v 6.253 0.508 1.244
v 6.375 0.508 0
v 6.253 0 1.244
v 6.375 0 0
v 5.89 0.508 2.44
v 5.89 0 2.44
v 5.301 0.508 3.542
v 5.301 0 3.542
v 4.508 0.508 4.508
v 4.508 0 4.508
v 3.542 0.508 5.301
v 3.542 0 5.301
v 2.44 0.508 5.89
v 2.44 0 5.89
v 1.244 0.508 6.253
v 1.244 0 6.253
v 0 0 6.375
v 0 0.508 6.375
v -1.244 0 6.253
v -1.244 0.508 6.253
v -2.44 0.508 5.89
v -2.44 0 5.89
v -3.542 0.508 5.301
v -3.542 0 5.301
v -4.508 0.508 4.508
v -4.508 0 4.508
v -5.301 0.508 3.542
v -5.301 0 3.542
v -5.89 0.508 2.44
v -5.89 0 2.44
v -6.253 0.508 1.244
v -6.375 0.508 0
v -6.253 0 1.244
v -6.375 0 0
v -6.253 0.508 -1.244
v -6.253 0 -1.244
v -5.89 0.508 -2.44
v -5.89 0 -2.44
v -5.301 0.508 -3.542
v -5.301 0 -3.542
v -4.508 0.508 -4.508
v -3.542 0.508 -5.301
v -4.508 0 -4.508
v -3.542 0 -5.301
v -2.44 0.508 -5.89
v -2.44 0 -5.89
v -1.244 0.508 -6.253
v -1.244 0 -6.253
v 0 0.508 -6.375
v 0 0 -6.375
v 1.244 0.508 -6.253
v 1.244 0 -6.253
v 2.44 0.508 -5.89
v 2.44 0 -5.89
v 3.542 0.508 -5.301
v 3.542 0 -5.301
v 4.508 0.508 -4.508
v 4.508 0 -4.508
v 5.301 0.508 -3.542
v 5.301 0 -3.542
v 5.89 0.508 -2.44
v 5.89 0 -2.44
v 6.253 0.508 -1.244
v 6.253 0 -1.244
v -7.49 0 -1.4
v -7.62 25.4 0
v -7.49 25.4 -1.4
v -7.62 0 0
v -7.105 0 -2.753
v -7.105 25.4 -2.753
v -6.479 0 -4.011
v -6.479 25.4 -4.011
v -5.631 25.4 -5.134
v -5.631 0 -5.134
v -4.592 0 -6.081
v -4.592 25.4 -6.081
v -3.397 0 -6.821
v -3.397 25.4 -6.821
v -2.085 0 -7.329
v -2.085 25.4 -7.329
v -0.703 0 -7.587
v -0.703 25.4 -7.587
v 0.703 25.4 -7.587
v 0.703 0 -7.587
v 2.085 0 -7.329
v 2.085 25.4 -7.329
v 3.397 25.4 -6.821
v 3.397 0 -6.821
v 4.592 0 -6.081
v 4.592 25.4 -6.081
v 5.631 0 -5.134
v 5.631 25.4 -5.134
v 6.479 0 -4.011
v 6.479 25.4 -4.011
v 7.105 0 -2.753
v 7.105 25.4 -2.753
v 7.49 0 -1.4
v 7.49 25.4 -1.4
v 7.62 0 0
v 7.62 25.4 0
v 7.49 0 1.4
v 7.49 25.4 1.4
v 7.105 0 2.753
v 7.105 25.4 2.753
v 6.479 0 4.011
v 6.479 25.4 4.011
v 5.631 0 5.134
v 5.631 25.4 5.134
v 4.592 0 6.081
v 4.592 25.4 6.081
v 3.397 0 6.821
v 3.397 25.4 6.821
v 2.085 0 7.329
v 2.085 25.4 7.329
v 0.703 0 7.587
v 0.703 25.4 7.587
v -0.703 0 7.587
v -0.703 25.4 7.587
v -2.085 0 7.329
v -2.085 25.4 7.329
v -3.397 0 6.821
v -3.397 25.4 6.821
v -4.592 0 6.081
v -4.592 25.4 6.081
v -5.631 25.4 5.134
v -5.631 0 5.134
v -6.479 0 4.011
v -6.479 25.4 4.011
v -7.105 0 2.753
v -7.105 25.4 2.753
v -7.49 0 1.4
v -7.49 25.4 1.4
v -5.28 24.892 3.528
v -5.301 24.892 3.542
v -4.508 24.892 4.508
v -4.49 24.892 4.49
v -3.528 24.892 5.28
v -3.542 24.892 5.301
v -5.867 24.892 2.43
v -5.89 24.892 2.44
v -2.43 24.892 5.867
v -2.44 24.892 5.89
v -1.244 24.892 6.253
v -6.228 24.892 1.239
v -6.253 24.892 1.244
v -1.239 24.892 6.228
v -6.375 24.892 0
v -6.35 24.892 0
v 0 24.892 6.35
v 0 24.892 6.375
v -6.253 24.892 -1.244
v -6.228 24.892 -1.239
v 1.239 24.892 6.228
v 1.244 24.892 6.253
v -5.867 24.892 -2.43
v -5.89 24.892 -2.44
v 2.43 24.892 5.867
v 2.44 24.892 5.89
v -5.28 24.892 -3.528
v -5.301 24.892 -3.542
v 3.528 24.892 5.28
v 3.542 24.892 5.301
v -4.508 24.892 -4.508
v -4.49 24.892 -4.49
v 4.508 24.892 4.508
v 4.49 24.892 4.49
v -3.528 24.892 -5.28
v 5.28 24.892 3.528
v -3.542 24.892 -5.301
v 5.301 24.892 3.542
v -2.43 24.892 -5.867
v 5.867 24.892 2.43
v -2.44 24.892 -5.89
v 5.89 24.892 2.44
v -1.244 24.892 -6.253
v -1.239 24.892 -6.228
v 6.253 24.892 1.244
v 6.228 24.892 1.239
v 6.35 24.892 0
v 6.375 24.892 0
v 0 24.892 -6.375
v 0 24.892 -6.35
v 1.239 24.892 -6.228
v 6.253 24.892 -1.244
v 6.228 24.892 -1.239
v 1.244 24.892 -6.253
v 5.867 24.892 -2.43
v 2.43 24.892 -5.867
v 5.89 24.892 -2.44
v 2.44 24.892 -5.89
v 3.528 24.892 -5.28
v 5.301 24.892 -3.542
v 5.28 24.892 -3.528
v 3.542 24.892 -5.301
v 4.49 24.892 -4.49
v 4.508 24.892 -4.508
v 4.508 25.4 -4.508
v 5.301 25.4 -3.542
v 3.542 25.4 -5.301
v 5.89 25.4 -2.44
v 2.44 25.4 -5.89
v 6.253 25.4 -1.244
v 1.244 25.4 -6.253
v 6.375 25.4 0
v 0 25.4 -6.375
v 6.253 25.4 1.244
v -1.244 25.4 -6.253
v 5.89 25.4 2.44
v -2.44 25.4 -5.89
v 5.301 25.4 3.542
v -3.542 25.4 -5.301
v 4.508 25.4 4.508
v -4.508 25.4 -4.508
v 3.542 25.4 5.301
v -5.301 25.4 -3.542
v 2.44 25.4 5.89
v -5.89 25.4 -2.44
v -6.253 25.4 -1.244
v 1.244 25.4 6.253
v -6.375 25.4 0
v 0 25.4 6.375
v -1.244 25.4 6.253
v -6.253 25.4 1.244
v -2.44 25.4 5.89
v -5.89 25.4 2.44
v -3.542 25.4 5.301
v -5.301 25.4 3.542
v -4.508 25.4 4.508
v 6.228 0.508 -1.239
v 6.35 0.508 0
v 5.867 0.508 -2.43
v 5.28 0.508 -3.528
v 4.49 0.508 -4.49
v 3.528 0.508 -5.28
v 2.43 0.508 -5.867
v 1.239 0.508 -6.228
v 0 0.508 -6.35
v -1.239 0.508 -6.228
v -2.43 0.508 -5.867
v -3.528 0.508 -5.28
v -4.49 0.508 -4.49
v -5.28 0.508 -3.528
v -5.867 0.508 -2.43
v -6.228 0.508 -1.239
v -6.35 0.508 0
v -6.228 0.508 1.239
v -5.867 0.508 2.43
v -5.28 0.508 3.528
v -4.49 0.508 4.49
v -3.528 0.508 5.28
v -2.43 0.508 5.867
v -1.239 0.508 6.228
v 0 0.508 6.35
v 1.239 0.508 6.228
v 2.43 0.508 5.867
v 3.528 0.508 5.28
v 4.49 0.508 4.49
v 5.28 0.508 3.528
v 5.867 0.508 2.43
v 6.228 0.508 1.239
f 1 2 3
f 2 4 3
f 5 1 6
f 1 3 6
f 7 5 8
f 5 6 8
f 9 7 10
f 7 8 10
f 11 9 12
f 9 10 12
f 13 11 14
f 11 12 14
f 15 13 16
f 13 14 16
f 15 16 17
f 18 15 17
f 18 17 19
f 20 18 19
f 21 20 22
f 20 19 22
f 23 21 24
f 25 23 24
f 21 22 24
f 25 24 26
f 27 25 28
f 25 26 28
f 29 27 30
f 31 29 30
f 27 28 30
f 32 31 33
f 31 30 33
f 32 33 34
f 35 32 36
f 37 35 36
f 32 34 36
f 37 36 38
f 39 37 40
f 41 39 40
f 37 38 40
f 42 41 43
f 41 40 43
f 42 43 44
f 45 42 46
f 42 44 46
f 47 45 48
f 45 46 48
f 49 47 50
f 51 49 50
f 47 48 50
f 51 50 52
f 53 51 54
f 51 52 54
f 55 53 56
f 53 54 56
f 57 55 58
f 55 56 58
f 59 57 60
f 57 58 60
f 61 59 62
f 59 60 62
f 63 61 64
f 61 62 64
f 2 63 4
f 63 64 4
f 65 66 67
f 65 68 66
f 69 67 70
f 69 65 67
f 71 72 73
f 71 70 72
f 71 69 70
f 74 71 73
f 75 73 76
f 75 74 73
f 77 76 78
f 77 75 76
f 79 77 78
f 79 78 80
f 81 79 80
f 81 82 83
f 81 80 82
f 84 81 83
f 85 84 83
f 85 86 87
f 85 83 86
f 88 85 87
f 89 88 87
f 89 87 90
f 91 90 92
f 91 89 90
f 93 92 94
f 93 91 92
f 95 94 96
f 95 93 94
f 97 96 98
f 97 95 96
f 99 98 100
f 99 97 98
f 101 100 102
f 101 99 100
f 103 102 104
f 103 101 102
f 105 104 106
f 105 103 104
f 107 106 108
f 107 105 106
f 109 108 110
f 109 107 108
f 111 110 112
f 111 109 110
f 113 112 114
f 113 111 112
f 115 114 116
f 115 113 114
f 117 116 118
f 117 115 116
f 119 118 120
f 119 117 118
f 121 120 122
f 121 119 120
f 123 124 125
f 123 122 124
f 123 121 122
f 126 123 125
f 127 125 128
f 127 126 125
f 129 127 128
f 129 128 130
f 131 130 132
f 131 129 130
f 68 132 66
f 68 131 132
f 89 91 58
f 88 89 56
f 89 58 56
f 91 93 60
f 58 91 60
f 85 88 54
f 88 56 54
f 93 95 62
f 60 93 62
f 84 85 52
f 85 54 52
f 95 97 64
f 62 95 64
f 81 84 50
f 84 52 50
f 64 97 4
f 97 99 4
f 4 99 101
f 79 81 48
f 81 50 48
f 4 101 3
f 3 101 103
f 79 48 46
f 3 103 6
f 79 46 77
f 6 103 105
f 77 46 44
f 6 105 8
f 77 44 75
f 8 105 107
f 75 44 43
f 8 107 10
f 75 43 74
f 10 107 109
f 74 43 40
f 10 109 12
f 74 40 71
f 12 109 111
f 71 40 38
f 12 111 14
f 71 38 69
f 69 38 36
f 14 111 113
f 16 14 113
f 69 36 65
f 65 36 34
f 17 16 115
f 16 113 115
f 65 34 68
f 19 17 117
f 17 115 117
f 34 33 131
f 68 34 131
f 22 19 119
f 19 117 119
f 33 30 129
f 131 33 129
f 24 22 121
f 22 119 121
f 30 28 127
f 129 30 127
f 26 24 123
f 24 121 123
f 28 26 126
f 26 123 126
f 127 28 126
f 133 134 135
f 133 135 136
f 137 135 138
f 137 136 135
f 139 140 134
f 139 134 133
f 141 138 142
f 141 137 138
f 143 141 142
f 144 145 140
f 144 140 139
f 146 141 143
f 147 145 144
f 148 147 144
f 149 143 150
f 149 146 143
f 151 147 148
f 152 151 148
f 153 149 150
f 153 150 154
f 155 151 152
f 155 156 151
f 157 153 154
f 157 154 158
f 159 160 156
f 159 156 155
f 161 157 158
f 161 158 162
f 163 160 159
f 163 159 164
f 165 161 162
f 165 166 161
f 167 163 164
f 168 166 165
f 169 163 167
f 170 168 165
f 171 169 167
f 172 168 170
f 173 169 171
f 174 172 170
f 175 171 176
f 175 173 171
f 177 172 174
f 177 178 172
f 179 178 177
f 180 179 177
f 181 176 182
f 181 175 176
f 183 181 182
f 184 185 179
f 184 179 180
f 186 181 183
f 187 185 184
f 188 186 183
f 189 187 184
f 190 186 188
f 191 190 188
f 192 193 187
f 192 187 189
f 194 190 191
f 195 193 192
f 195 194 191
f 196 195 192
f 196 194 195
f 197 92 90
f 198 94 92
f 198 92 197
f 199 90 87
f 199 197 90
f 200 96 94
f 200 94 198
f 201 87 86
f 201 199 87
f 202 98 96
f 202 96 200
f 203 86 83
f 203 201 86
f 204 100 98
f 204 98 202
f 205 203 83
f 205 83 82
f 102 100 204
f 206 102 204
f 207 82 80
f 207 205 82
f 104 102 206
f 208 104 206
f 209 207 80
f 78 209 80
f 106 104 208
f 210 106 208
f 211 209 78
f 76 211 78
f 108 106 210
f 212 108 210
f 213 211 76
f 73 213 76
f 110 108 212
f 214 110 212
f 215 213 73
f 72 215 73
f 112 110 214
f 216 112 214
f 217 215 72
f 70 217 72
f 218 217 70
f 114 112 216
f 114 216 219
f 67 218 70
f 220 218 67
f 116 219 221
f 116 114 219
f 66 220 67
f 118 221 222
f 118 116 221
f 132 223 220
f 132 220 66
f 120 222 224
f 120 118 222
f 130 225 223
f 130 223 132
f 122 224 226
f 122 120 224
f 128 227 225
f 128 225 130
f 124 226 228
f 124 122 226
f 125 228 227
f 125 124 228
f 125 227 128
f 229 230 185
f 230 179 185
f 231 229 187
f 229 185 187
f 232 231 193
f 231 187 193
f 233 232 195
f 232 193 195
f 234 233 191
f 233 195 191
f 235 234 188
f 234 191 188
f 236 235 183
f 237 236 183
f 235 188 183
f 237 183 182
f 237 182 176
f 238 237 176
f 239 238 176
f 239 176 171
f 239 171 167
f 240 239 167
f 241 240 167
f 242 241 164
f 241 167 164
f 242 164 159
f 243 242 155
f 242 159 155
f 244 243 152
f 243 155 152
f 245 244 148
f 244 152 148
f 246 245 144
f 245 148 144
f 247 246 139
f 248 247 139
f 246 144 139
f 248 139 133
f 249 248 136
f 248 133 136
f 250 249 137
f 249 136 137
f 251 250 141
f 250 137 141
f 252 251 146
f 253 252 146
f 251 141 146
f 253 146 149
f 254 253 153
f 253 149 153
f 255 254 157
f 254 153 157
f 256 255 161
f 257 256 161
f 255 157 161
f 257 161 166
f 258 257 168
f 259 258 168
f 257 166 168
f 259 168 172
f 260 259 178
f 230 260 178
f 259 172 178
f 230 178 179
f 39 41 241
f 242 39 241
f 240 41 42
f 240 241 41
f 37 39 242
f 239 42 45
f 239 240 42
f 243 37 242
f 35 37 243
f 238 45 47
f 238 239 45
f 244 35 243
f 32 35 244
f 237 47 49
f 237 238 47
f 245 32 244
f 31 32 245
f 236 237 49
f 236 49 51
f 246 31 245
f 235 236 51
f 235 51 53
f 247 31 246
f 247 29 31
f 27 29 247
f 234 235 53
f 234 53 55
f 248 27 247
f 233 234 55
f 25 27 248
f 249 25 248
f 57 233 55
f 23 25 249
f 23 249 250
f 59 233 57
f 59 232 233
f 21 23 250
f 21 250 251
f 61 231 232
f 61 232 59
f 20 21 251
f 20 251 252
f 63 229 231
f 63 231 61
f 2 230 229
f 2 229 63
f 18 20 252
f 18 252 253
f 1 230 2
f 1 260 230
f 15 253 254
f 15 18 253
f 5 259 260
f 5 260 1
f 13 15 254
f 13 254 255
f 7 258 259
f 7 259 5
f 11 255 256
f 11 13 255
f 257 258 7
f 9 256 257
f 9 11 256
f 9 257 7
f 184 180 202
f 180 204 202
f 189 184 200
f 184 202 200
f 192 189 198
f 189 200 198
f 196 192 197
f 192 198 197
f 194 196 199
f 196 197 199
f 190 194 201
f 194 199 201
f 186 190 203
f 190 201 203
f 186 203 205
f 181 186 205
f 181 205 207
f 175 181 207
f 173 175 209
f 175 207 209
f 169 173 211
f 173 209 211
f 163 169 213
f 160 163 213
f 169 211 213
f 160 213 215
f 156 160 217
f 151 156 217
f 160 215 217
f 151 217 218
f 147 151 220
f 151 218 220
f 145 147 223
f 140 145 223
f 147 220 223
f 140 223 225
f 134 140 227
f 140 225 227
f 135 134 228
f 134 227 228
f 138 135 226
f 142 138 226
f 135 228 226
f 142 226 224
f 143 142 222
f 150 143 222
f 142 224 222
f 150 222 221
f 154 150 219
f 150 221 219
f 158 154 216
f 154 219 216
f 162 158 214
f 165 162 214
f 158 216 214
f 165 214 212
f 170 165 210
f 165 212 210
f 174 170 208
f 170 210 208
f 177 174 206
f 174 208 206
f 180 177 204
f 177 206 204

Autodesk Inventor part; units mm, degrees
ref_plane "YZ Plane" through (0, 0, 0) normal (1, 0, 0) x (0, 1, 0)
ref_plane "XZ Plane" through (0, 0, 0) normal (0, 1, 0) x (-1, 0, 0)
ref_plane "XY Plane" through (0, 0, 0) normal (0, 0, 1) x (1, 0, 0)
sketch "Sketch1" plane through (0, 0, 0) normal (0, 1, 0) x (-1, 0, 0)
  circle A0 centre (0, 0) radius 7.62
  dimension "d0" = 15.24
extrude "Extrusion1" add sketch "Sketch1" along normal blind 25.4
sketch "Sketch2" plane through (0, 25.4, 0) normal (0, 1, 0) x (1, 0, 0)
  circle A0 centre (0, 0) radius 6.35
  dimension "d3" = 12.7
extrude "Extrusion2" cut sketch "Sketch2" against normal up to surface (25.4 mm away)
sketch "Sketch3" plane through (0, 25.4, 0) normal (0, 1, 0) x (1, 0, 0)
  circle A0 centre (0, 0) radius 6.3754
  dimension "d6" = 12.7508
extrude "Extrusion3" cut sketch "Sketch3" against normal blind 0.508
sketch "Sketch4" plane through (0, 0, 0) normal (0, -1, 0) x (1, 0, 0)
  circle A0 centre (0, 0) radius 6.3754
  dimension "d9" = 12.7508
extrude "Extrusion4" cut sketch "Sketch4" against normal blind 0.508
properties part number "brassbushing" material "Brass, Soft Yellow"
